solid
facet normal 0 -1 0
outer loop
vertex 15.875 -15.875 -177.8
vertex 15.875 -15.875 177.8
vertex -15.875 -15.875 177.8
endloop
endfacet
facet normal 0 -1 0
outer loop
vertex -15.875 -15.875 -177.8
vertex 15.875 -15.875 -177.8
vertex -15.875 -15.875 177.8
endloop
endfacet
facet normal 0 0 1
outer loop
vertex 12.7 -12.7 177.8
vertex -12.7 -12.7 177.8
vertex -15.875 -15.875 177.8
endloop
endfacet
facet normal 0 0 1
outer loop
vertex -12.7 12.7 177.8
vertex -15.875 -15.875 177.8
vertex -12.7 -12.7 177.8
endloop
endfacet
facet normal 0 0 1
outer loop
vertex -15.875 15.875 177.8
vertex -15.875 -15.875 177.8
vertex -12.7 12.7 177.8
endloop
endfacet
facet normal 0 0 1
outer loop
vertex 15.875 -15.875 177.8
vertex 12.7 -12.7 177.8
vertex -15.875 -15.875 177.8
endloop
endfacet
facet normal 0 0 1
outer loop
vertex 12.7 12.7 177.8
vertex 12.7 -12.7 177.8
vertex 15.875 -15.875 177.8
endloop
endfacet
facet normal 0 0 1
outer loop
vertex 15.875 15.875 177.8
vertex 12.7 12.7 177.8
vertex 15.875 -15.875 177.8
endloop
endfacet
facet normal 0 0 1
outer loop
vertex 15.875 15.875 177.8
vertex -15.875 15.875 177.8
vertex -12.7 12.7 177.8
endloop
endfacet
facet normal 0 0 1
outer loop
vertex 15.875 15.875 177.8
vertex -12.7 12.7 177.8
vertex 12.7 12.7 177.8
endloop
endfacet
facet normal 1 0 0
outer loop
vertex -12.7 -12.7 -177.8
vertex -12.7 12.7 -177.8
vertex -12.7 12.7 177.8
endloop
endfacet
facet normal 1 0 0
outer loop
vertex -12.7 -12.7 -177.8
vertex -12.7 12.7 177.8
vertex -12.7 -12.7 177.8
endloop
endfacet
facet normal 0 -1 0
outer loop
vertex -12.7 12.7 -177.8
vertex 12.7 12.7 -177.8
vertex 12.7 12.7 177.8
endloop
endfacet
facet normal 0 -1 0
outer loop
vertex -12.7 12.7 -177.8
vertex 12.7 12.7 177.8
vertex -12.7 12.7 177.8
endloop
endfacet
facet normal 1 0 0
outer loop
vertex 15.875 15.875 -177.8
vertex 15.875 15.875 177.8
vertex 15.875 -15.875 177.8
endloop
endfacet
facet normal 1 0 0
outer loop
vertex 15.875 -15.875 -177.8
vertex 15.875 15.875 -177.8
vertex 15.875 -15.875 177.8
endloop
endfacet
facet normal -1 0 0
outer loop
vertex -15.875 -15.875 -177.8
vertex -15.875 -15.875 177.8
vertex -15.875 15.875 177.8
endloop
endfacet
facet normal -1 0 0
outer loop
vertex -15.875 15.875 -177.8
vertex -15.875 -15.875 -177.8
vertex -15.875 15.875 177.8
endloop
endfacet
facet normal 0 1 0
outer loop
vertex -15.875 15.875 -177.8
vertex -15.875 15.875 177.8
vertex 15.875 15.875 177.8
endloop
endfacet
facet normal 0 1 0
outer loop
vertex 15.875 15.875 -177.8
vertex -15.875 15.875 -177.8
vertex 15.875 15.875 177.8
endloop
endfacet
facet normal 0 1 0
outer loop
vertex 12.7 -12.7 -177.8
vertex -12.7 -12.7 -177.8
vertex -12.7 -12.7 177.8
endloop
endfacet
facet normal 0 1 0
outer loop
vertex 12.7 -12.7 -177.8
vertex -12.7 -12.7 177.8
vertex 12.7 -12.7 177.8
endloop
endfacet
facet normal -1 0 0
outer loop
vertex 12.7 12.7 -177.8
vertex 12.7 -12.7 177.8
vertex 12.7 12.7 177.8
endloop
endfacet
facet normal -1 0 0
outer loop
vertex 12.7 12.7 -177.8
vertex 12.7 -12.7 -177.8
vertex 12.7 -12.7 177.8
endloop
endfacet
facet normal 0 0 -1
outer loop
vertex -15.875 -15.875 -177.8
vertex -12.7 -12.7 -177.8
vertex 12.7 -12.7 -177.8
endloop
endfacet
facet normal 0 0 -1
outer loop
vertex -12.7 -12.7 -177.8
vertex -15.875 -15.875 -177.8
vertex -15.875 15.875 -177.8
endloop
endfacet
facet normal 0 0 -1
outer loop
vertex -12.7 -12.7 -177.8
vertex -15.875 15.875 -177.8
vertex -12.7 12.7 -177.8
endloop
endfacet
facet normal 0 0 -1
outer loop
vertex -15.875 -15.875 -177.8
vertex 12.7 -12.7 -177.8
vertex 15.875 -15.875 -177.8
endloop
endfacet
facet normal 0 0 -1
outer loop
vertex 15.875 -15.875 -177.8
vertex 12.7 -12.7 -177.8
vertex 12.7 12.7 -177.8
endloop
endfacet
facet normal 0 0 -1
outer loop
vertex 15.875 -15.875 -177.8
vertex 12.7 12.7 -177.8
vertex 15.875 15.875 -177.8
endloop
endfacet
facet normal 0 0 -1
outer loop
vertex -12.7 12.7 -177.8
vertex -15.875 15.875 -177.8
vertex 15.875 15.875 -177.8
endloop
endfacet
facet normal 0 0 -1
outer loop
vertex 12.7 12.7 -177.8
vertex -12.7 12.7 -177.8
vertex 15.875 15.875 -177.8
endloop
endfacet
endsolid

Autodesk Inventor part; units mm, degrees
ref_plane "YZ Plane" through (0, 0, 0) normal (1, 0, 0) x (0, 1, 0)
ref_plane "XZ Plane" through (0, 0, 0) normal (0, 1, 0) x (-1, 0, 0)
ref_plane "XY Plane" through (0, 0, 0) normal (0, 0, 1) x (1, 0, 0)
sketch "Sketch1" plane through (0, 0, 0) normal (0, 0, 1) x (1, 0, 0)
  line L0 (-15.875, 15.875) -> (15.875, 15.875)
  line L1 (15.875, 15.875) -> (15.875, -15.875)
  line L2 (15.875, -15.875) -> (-15.875, -15.875)
  line L3 (-15.875, -15.875) -> (-15.875, 15.875)
  line L4 (12.7, 12.7) -> (-12.7, 12.7)
  line L5 (-12.7, 12.7) -> (-12.7, -12.7)
  line L6 (-12.7, -12.7) -> (12.7, -12.7)
  line L7 (12.7, -12.7) -> (12.7, 12.7)
  point P0 (0, 0)
  point P1 (-15.875, 0)
  point P2 (0, 15.875)
  dimension "d0" = 31.75
  dimension "d1" = 3.175
extrude "Extrusion1" add sketch "Sketch1" along normal mid plane 355.6
properties part number "Handle Slide"
